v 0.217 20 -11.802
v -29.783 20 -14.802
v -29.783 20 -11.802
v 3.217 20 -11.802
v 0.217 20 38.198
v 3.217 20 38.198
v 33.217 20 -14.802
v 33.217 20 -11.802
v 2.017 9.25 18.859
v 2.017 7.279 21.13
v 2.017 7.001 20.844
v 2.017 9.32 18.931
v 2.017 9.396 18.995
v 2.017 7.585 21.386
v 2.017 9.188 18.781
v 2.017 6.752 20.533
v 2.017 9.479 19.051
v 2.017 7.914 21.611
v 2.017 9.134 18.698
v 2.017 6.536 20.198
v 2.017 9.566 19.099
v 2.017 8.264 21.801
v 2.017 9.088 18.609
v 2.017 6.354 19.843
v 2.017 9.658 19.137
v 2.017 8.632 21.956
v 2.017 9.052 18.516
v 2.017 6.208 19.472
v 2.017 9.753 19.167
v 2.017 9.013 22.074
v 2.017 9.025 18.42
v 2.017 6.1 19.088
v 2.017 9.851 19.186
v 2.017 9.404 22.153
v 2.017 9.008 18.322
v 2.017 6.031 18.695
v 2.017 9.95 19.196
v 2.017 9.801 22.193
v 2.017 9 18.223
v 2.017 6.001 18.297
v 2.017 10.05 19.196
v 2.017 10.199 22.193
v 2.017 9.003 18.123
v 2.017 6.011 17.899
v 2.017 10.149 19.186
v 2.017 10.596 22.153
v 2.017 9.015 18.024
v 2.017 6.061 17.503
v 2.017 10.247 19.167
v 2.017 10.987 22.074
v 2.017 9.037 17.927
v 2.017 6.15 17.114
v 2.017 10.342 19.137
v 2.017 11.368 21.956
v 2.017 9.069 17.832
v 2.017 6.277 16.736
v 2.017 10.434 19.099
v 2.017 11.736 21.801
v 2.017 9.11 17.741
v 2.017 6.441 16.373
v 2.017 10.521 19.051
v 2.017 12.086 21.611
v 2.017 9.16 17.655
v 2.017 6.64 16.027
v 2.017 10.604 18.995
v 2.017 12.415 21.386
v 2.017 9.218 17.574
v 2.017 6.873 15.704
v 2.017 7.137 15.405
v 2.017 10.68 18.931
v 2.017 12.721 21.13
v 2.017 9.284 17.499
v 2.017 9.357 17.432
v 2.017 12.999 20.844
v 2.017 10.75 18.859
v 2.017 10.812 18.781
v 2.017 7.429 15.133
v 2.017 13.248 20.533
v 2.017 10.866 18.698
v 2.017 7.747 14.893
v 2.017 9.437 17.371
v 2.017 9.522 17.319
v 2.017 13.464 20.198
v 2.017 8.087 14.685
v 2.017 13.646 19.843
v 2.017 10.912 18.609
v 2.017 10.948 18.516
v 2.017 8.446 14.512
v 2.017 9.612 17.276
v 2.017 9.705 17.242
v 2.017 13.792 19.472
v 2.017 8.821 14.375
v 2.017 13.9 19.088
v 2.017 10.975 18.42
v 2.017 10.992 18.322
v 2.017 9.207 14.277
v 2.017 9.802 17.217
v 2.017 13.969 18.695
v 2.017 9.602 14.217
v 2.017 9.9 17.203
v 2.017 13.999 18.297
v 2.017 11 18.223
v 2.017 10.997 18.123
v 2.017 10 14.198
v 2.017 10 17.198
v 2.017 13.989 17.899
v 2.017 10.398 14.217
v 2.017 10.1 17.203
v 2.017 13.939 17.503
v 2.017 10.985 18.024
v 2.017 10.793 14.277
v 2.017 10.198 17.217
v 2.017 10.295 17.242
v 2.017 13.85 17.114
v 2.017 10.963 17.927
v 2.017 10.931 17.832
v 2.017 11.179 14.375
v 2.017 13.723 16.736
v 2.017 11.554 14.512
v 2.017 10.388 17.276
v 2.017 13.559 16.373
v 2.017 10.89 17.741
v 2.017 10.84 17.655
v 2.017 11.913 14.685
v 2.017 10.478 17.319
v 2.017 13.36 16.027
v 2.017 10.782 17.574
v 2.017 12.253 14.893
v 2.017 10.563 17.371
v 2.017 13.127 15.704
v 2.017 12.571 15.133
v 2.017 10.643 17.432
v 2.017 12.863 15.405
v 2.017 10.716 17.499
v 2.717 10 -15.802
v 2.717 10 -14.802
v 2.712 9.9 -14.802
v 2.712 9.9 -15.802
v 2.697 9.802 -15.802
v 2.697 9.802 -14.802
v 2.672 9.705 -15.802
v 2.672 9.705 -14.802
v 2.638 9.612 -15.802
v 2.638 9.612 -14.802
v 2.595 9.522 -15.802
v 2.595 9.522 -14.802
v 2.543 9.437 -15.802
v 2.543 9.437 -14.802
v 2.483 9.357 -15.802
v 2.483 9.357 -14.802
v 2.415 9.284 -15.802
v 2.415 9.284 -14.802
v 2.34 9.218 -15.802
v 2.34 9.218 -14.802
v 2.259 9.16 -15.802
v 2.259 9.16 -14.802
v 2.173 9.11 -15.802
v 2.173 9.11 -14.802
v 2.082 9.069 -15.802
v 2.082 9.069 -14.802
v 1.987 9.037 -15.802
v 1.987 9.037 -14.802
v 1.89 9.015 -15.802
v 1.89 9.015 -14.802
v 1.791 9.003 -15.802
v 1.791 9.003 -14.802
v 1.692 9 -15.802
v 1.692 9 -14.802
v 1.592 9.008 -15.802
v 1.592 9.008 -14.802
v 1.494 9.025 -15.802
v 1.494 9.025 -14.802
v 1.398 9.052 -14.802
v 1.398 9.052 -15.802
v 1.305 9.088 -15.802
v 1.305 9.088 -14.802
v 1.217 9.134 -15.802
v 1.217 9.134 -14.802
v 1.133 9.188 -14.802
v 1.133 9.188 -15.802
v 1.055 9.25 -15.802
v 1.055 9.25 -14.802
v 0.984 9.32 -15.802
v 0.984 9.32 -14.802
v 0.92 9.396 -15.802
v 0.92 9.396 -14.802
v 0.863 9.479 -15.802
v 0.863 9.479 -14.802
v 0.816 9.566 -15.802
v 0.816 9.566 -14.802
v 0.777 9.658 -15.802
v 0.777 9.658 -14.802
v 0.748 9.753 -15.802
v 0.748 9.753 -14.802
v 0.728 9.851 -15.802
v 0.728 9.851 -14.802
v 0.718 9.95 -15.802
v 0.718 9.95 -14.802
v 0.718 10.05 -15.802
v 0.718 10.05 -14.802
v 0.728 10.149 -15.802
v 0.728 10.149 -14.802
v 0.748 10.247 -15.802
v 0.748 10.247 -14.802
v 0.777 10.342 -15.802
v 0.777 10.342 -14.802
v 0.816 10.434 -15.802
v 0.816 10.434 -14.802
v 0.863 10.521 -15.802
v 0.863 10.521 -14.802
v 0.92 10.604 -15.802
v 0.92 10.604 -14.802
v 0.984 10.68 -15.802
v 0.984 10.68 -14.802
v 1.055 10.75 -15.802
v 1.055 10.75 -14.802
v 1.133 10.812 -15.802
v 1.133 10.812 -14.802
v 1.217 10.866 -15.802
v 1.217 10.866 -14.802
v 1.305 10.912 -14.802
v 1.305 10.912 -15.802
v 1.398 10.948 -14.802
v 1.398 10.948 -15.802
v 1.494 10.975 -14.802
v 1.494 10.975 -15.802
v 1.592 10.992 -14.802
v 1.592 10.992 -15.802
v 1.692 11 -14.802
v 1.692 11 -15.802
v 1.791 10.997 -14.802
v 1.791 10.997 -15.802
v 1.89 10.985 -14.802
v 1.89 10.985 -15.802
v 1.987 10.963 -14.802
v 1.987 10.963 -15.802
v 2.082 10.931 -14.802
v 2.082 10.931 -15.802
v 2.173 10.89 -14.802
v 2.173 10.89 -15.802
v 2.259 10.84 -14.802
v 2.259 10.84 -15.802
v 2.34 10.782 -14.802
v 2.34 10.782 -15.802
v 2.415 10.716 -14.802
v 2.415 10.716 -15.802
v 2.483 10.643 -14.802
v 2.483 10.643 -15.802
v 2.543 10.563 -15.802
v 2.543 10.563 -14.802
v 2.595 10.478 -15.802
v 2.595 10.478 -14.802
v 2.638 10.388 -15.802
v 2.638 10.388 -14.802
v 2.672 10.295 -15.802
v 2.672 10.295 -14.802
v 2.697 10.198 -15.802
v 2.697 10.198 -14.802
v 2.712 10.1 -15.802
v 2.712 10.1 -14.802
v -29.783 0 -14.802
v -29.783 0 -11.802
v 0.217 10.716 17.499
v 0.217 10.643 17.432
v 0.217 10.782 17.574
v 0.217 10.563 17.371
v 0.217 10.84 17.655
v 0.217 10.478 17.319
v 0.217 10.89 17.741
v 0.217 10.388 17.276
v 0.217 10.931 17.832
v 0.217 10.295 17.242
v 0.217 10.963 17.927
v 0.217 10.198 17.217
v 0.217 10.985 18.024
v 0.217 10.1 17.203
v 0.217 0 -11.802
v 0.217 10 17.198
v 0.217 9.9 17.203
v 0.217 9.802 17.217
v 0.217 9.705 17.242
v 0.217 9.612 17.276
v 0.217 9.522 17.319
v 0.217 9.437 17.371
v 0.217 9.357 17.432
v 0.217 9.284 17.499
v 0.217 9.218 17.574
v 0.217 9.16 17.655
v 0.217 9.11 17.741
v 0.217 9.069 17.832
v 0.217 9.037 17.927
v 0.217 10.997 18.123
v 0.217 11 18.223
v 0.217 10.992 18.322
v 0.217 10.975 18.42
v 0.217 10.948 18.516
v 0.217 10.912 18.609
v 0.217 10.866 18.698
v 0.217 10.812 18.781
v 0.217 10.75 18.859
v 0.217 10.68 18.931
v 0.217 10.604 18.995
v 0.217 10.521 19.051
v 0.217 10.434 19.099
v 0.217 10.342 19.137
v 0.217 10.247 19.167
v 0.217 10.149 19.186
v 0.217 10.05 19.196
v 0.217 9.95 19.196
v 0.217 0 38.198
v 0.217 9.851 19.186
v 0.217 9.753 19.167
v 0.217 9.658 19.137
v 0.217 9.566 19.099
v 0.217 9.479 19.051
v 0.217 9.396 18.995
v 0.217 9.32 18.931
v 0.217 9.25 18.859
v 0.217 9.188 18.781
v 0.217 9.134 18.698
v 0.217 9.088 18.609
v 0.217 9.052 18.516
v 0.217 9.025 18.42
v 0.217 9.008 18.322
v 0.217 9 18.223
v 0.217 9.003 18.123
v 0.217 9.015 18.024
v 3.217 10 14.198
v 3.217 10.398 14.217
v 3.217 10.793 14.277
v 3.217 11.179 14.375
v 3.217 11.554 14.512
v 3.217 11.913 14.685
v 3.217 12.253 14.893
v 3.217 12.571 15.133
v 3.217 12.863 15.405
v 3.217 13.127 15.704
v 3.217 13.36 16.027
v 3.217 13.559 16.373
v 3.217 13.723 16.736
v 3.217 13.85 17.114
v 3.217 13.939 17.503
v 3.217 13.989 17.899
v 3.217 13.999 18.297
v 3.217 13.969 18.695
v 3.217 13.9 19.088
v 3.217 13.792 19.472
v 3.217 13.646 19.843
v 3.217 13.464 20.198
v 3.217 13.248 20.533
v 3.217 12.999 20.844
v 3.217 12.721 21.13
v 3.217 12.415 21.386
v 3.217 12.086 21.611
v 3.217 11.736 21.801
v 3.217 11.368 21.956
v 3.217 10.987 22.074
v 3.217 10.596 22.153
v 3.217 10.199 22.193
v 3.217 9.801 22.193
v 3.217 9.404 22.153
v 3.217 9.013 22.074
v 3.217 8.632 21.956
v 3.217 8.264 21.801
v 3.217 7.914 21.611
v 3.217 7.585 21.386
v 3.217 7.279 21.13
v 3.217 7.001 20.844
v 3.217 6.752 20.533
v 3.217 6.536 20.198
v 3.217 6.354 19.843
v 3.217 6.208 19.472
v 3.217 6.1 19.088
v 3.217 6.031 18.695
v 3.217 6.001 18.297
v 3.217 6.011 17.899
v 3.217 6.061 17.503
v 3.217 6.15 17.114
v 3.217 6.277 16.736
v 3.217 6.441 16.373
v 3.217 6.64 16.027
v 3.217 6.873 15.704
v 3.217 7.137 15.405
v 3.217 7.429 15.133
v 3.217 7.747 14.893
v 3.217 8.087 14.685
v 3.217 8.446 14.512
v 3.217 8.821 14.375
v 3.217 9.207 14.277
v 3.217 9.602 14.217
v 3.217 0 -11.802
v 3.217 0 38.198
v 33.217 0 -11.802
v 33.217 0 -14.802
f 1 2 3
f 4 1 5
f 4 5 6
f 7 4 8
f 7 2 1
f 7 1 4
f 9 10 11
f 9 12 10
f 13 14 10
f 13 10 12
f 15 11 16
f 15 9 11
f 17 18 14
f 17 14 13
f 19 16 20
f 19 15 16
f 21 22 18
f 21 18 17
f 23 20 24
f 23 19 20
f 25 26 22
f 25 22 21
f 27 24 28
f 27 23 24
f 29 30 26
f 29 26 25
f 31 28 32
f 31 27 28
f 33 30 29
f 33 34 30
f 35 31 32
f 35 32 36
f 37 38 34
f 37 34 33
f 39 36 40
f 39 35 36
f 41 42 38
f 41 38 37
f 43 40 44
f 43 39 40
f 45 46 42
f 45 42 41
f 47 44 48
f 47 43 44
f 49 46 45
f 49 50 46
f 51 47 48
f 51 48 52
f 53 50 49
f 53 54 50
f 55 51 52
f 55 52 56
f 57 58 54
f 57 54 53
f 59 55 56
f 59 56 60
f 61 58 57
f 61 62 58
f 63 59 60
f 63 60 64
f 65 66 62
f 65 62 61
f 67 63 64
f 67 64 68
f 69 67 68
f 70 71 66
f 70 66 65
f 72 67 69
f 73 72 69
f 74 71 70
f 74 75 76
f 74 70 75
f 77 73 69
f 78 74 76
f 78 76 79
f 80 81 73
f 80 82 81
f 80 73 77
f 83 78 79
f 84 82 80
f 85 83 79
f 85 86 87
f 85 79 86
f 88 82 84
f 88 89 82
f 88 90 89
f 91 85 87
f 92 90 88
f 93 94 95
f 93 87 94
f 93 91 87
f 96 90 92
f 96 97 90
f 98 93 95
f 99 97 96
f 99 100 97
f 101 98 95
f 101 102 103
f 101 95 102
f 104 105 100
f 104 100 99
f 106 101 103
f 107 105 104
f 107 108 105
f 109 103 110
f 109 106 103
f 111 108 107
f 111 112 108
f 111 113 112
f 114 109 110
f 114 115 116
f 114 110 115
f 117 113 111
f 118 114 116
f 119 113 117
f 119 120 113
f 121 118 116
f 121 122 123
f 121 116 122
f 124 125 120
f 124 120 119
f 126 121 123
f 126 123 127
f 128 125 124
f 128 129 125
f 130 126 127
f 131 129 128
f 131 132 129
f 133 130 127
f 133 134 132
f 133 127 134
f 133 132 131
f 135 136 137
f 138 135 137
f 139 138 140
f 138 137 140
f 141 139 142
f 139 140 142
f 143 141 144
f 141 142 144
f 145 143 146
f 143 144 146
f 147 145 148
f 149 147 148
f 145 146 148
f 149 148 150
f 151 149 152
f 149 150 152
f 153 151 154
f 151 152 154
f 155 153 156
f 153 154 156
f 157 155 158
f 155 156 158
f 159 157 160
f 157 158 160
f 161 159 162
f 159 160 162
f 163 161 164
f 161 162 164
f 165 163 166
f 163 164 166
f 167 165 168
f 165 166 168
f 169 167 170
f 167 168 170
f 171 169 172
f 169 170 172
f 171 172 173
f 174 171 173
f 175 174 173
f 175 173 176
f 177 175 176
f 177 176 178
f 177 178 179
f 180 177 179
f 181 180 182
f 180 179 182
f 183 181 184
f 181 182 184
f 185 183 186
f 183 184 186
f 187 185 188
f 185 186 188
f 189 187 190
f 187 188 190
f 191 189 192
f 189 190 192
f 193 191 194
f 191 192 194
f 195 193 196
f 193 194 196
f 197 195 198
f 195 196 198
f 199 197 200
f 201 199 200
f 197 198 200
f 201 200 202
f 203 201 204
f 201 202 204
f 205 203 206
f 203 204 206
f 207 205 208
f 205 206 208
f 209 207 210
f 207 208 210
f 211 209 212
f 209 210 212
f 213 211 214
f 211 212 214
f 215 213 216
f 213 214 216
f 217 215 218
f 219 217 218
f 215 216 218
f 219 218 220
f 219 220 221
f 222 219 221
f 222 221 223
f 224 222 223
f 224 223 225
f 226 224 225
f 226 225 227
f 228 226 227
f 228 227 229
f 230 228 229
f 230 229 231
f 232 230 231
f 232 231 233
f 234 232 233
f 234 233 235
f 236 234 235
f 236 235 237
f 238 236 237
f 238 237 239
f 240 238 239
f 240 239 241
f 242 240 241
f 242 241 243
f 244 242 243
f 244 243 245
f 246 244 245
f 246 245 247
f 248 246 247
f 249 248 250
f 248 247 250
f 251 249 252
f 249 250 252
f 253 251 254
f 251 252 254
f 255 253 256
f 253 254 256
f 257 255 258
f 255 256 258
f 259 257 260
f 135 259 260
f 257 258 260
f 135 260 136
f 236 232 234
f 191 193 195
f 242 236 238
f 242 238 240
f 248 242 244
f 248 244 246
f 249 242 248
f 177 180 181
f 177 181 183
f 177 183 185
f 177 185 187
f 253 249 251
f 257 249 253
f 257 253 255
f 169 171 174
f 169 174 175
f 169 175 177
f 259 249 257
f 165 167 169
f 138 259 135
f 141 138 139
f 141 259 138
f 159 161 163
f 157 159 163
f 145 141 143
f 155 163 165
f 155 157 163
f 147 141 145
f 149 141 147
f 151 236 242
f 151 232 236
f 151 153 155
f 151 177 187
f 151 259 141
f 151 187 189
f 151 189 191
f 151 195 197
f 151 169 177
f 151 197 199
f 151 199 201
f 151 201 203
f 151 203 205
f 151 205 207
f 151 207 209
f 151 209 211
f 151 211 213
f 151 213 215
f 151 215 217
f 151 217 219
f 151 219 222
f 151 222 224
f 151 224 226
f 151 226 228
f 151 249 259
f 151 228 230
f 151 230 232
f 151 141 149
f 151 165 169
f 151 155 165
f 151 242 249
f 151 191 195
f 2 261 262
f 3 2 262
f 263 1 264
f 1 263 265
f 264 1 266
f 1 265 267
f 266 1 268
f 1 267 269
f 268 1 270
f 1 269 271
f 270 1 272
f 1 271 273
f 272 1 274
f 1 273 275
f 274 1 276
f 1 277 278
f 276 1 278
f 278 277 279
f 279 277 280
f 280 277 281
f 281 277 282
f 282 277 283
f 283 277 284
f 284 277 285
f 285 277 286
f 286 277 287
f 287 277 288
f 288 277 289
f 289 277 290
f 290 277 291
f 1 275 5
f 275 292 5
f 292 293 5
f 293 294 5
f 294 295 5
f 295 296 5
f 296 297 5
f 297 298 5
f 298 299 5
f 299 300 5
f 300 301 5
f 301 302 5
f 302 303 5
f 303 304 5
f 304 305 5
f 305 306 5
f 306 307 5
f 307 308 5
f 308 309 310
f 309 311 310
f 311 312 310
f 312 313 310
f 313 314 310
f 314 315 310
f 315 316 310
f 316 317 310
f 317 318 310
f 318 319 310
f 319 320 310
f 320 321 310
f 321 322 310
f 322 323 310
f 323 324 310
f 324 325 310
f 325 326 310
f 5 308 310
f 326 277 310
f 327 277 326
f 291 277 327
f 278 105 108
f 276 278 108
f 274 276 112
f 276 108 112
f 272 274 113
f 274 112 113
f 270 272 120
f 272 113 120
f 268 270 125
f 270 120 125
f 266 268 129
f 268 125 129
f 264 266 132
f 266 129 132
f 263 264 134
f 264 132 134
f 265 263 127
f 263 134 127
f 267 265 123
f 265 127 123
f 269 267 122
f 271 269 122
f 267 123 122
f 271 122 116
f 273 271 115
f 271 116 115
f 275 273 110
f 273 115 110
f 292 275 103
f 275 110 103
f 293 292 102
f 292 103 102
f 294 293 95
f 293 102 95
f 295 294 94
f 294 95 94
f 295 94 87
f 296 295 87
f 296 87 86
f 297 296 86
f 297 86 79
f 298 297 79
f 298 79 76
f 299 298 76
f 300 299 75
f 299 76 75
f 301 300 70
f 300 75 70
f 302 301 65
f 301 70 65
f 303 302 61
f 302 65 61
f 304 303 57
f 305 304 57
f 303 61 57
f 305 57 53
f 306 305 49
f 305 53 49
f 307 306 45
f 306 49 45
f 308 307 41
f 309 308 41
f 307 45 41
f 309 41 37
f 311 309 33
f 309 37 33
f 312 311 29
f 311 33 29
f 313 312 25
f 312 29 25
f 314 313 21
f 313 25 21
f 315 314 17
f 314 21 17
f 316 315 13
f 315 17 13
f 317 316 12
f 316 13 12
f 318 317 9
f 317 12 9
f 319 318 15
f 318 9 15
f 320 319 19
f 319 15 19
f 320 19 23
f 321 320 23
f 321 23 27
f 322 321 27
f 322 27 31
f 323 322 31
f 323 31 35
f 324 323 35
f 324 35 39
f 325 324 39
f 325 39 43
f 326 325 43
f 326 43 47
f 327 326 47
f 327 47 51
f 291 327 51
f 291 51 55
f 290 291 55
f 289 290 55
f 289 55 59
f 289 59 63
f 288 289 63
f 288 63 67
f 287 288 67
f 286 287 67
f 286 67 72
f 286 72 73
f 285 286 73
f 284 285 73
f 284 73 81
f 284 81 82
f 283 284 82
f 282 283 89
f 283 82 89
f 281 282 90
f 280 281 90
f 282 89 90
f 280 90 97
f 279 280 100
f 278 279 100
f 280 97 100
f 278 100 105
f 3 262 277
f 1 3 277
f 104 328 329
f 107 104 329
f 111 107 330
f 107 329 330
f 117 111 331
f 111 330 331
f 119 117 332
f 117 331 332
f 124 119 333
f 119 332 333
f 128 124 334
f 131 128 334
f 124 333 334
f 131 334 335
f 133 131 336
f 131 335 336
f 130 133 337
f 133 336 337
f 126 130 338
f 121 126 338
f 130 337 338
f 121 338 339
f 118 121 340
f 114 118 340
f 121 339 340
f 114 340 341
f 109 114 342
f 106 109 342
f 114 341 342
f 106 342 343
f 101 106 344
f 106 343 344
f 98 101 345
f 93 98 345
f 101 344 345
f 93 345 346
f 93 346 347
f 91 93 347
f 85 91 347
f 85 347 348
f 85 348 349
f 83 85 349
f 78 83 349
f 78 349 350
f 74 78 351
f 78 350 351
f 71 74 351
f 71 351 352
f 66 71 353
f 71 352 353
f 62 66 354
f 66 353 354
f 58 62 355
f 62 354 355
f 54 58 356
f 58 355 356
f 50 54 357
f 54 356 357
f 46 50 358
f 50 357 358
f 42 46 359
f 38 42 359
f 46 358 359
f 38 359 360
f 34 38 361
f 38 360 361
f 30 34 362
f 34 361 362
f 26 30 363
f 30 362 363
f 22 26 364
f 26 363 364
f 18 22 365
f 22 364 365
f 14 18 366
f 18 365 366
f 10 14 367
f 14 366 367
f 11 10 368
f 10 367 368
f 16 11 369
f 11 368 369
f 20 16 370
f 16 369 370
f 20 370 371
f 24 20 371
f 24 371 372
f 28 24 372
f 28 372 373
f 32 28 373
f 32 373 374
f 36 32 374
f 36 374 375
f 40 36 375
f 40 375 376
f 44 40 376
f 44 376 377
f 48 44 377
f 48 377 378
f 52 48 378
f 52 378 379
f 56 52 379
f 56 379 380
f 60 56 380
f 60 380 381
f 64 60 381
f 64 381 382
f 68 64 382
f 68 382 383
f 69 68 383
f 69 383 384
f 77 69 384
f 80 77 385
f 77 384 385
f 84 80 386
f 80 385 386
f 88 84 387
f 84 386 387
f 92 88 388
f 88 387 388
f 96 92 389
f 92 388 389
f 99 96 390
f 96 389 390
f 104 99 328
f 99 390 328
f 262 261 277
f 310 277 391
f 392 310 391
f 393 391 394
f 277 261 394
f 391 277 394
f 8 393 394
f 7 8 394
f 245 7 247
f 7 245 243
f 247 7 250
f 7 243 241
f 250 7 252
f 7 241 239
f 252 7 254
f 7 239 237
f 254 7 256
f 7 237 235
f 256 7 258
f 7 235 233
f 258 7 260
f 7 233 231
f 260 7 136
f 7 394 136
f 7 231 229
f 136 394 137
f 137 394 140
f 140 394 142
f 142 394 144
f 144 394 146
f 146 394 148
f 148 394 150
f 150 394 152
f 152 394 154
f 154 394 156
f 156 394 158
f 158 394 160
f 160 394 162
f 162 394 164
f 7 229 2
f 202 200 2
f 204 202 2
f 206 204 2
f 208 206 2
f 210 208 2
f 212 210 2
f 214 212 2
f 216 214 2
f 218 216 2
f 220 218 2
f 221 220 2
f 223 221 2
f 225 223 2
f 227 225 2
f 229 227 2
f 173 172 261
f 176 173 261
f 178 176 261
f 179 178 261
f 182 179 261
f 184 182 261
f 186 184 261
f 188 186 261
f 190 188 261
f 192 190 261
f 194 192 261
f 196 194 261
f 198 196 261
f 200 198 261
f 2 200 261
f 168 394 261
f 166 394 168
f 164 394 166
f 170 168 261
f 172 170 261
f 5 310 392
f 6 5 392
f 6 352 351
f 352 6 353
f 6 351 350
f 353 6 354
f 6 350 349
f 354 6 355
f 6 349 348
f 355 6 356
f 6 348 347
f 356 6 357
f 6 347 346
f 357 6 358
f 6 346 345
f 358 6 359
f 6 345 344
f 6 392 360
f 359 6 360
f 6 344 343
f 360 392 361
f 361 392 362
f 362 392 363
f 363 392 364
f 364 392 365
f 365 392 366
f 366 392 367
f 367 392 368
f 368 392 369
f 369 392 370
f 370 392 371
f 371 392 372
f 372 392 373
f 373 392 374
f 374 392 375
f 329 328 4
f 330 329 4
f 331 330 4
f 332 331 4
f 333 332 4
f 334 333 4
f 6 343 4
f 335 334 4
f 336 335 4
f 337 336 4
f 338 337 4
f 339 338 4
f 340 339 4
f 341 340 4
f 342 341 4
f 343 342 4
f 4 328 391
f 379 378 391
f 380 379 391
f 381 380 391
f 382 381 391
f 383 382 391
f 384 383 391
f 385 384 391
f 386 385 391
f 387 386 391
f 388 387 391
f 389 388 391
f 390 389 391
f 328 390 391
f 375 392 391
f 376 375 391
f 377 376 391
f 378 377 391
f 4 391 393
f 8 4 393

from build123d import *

# Parameters (mm, degrees)
SALIENTE_EXTRUIR1_DEPTH = 20
CROQUIS2_R              = 4
CORTAR_EXTRUIR1_DEPTH   = 1.2
CROQUIS3_R              = 1
CORTAR_EXTRUIR2_DEPTH   = 1.8
CROQUIS5_R              = 1
SALIENTE_EXTRUIR2_DEPTH = 1


with BuildPart() as part:
    # Croquis1 → Saliente-Extruir1 (new body)
    with BuildSketch(Plane(origin=(0, 0, 0), x_dir=(1, 0, 0), z_dir=(0, 1, 0))):
        Polygon((3.21663979, -38.197597505), (3.21663979, 11.802402495), (33.21663979, 11.802402495), (33.21663979, 14.802402495), (-29.78336021, 14.802402495), (-29.78336021, 11.802402495), (0.21663979, 11.802402495), (0.21663979, -38.197597505), align=None)
    extrude(amount=SALIENTE_EXTRUIR1_DEPTH)

    # Croquis2 → Cortar-Extruir1 (cut)
    with BuildSketch(Plane(origin=(3.21663979, 0, 0), x_dir=(0, 0, -1), z_dir=(1, 0, 0))):
        with Locations((-18.197597505, 10)):
            Circle(CROQUIS2_R)
    extrude(amount=-CORTAR_EXTRUIR1_DEPTH, mode=Mode.SUBTRACT)

    # Croquis3 → Cortar-Extruir2 (cut)
    with BuildSketch(Plane(origin=(2.01663979, 0, 0), x_dir=(0, 0, -1), z_dir=(1, 0, 0))):
        with Locations((-18.197597505, 10)):
            Circle(CROQUIS3_R)
    extrude(amount=-CORTAR_EXTRUIR2_DEPTH, mode=Mode.SUBTRACT)

    # Croquis5 → Saliente-Extruir2 (add)
    with BuildSketch(Plane(origin=(0, 0, -14.802402495), x_dir=(-1, 0, 0), z_dir=(0, 0, -1))):
        with Locations(Location((-1.71663979, 10, 0), (0, 0, 180))):
            Circle(CROQUIS5_R)
    extrude(amount=SALIENTE_EXTRUIR2_DEPTH)


solid = part.part
